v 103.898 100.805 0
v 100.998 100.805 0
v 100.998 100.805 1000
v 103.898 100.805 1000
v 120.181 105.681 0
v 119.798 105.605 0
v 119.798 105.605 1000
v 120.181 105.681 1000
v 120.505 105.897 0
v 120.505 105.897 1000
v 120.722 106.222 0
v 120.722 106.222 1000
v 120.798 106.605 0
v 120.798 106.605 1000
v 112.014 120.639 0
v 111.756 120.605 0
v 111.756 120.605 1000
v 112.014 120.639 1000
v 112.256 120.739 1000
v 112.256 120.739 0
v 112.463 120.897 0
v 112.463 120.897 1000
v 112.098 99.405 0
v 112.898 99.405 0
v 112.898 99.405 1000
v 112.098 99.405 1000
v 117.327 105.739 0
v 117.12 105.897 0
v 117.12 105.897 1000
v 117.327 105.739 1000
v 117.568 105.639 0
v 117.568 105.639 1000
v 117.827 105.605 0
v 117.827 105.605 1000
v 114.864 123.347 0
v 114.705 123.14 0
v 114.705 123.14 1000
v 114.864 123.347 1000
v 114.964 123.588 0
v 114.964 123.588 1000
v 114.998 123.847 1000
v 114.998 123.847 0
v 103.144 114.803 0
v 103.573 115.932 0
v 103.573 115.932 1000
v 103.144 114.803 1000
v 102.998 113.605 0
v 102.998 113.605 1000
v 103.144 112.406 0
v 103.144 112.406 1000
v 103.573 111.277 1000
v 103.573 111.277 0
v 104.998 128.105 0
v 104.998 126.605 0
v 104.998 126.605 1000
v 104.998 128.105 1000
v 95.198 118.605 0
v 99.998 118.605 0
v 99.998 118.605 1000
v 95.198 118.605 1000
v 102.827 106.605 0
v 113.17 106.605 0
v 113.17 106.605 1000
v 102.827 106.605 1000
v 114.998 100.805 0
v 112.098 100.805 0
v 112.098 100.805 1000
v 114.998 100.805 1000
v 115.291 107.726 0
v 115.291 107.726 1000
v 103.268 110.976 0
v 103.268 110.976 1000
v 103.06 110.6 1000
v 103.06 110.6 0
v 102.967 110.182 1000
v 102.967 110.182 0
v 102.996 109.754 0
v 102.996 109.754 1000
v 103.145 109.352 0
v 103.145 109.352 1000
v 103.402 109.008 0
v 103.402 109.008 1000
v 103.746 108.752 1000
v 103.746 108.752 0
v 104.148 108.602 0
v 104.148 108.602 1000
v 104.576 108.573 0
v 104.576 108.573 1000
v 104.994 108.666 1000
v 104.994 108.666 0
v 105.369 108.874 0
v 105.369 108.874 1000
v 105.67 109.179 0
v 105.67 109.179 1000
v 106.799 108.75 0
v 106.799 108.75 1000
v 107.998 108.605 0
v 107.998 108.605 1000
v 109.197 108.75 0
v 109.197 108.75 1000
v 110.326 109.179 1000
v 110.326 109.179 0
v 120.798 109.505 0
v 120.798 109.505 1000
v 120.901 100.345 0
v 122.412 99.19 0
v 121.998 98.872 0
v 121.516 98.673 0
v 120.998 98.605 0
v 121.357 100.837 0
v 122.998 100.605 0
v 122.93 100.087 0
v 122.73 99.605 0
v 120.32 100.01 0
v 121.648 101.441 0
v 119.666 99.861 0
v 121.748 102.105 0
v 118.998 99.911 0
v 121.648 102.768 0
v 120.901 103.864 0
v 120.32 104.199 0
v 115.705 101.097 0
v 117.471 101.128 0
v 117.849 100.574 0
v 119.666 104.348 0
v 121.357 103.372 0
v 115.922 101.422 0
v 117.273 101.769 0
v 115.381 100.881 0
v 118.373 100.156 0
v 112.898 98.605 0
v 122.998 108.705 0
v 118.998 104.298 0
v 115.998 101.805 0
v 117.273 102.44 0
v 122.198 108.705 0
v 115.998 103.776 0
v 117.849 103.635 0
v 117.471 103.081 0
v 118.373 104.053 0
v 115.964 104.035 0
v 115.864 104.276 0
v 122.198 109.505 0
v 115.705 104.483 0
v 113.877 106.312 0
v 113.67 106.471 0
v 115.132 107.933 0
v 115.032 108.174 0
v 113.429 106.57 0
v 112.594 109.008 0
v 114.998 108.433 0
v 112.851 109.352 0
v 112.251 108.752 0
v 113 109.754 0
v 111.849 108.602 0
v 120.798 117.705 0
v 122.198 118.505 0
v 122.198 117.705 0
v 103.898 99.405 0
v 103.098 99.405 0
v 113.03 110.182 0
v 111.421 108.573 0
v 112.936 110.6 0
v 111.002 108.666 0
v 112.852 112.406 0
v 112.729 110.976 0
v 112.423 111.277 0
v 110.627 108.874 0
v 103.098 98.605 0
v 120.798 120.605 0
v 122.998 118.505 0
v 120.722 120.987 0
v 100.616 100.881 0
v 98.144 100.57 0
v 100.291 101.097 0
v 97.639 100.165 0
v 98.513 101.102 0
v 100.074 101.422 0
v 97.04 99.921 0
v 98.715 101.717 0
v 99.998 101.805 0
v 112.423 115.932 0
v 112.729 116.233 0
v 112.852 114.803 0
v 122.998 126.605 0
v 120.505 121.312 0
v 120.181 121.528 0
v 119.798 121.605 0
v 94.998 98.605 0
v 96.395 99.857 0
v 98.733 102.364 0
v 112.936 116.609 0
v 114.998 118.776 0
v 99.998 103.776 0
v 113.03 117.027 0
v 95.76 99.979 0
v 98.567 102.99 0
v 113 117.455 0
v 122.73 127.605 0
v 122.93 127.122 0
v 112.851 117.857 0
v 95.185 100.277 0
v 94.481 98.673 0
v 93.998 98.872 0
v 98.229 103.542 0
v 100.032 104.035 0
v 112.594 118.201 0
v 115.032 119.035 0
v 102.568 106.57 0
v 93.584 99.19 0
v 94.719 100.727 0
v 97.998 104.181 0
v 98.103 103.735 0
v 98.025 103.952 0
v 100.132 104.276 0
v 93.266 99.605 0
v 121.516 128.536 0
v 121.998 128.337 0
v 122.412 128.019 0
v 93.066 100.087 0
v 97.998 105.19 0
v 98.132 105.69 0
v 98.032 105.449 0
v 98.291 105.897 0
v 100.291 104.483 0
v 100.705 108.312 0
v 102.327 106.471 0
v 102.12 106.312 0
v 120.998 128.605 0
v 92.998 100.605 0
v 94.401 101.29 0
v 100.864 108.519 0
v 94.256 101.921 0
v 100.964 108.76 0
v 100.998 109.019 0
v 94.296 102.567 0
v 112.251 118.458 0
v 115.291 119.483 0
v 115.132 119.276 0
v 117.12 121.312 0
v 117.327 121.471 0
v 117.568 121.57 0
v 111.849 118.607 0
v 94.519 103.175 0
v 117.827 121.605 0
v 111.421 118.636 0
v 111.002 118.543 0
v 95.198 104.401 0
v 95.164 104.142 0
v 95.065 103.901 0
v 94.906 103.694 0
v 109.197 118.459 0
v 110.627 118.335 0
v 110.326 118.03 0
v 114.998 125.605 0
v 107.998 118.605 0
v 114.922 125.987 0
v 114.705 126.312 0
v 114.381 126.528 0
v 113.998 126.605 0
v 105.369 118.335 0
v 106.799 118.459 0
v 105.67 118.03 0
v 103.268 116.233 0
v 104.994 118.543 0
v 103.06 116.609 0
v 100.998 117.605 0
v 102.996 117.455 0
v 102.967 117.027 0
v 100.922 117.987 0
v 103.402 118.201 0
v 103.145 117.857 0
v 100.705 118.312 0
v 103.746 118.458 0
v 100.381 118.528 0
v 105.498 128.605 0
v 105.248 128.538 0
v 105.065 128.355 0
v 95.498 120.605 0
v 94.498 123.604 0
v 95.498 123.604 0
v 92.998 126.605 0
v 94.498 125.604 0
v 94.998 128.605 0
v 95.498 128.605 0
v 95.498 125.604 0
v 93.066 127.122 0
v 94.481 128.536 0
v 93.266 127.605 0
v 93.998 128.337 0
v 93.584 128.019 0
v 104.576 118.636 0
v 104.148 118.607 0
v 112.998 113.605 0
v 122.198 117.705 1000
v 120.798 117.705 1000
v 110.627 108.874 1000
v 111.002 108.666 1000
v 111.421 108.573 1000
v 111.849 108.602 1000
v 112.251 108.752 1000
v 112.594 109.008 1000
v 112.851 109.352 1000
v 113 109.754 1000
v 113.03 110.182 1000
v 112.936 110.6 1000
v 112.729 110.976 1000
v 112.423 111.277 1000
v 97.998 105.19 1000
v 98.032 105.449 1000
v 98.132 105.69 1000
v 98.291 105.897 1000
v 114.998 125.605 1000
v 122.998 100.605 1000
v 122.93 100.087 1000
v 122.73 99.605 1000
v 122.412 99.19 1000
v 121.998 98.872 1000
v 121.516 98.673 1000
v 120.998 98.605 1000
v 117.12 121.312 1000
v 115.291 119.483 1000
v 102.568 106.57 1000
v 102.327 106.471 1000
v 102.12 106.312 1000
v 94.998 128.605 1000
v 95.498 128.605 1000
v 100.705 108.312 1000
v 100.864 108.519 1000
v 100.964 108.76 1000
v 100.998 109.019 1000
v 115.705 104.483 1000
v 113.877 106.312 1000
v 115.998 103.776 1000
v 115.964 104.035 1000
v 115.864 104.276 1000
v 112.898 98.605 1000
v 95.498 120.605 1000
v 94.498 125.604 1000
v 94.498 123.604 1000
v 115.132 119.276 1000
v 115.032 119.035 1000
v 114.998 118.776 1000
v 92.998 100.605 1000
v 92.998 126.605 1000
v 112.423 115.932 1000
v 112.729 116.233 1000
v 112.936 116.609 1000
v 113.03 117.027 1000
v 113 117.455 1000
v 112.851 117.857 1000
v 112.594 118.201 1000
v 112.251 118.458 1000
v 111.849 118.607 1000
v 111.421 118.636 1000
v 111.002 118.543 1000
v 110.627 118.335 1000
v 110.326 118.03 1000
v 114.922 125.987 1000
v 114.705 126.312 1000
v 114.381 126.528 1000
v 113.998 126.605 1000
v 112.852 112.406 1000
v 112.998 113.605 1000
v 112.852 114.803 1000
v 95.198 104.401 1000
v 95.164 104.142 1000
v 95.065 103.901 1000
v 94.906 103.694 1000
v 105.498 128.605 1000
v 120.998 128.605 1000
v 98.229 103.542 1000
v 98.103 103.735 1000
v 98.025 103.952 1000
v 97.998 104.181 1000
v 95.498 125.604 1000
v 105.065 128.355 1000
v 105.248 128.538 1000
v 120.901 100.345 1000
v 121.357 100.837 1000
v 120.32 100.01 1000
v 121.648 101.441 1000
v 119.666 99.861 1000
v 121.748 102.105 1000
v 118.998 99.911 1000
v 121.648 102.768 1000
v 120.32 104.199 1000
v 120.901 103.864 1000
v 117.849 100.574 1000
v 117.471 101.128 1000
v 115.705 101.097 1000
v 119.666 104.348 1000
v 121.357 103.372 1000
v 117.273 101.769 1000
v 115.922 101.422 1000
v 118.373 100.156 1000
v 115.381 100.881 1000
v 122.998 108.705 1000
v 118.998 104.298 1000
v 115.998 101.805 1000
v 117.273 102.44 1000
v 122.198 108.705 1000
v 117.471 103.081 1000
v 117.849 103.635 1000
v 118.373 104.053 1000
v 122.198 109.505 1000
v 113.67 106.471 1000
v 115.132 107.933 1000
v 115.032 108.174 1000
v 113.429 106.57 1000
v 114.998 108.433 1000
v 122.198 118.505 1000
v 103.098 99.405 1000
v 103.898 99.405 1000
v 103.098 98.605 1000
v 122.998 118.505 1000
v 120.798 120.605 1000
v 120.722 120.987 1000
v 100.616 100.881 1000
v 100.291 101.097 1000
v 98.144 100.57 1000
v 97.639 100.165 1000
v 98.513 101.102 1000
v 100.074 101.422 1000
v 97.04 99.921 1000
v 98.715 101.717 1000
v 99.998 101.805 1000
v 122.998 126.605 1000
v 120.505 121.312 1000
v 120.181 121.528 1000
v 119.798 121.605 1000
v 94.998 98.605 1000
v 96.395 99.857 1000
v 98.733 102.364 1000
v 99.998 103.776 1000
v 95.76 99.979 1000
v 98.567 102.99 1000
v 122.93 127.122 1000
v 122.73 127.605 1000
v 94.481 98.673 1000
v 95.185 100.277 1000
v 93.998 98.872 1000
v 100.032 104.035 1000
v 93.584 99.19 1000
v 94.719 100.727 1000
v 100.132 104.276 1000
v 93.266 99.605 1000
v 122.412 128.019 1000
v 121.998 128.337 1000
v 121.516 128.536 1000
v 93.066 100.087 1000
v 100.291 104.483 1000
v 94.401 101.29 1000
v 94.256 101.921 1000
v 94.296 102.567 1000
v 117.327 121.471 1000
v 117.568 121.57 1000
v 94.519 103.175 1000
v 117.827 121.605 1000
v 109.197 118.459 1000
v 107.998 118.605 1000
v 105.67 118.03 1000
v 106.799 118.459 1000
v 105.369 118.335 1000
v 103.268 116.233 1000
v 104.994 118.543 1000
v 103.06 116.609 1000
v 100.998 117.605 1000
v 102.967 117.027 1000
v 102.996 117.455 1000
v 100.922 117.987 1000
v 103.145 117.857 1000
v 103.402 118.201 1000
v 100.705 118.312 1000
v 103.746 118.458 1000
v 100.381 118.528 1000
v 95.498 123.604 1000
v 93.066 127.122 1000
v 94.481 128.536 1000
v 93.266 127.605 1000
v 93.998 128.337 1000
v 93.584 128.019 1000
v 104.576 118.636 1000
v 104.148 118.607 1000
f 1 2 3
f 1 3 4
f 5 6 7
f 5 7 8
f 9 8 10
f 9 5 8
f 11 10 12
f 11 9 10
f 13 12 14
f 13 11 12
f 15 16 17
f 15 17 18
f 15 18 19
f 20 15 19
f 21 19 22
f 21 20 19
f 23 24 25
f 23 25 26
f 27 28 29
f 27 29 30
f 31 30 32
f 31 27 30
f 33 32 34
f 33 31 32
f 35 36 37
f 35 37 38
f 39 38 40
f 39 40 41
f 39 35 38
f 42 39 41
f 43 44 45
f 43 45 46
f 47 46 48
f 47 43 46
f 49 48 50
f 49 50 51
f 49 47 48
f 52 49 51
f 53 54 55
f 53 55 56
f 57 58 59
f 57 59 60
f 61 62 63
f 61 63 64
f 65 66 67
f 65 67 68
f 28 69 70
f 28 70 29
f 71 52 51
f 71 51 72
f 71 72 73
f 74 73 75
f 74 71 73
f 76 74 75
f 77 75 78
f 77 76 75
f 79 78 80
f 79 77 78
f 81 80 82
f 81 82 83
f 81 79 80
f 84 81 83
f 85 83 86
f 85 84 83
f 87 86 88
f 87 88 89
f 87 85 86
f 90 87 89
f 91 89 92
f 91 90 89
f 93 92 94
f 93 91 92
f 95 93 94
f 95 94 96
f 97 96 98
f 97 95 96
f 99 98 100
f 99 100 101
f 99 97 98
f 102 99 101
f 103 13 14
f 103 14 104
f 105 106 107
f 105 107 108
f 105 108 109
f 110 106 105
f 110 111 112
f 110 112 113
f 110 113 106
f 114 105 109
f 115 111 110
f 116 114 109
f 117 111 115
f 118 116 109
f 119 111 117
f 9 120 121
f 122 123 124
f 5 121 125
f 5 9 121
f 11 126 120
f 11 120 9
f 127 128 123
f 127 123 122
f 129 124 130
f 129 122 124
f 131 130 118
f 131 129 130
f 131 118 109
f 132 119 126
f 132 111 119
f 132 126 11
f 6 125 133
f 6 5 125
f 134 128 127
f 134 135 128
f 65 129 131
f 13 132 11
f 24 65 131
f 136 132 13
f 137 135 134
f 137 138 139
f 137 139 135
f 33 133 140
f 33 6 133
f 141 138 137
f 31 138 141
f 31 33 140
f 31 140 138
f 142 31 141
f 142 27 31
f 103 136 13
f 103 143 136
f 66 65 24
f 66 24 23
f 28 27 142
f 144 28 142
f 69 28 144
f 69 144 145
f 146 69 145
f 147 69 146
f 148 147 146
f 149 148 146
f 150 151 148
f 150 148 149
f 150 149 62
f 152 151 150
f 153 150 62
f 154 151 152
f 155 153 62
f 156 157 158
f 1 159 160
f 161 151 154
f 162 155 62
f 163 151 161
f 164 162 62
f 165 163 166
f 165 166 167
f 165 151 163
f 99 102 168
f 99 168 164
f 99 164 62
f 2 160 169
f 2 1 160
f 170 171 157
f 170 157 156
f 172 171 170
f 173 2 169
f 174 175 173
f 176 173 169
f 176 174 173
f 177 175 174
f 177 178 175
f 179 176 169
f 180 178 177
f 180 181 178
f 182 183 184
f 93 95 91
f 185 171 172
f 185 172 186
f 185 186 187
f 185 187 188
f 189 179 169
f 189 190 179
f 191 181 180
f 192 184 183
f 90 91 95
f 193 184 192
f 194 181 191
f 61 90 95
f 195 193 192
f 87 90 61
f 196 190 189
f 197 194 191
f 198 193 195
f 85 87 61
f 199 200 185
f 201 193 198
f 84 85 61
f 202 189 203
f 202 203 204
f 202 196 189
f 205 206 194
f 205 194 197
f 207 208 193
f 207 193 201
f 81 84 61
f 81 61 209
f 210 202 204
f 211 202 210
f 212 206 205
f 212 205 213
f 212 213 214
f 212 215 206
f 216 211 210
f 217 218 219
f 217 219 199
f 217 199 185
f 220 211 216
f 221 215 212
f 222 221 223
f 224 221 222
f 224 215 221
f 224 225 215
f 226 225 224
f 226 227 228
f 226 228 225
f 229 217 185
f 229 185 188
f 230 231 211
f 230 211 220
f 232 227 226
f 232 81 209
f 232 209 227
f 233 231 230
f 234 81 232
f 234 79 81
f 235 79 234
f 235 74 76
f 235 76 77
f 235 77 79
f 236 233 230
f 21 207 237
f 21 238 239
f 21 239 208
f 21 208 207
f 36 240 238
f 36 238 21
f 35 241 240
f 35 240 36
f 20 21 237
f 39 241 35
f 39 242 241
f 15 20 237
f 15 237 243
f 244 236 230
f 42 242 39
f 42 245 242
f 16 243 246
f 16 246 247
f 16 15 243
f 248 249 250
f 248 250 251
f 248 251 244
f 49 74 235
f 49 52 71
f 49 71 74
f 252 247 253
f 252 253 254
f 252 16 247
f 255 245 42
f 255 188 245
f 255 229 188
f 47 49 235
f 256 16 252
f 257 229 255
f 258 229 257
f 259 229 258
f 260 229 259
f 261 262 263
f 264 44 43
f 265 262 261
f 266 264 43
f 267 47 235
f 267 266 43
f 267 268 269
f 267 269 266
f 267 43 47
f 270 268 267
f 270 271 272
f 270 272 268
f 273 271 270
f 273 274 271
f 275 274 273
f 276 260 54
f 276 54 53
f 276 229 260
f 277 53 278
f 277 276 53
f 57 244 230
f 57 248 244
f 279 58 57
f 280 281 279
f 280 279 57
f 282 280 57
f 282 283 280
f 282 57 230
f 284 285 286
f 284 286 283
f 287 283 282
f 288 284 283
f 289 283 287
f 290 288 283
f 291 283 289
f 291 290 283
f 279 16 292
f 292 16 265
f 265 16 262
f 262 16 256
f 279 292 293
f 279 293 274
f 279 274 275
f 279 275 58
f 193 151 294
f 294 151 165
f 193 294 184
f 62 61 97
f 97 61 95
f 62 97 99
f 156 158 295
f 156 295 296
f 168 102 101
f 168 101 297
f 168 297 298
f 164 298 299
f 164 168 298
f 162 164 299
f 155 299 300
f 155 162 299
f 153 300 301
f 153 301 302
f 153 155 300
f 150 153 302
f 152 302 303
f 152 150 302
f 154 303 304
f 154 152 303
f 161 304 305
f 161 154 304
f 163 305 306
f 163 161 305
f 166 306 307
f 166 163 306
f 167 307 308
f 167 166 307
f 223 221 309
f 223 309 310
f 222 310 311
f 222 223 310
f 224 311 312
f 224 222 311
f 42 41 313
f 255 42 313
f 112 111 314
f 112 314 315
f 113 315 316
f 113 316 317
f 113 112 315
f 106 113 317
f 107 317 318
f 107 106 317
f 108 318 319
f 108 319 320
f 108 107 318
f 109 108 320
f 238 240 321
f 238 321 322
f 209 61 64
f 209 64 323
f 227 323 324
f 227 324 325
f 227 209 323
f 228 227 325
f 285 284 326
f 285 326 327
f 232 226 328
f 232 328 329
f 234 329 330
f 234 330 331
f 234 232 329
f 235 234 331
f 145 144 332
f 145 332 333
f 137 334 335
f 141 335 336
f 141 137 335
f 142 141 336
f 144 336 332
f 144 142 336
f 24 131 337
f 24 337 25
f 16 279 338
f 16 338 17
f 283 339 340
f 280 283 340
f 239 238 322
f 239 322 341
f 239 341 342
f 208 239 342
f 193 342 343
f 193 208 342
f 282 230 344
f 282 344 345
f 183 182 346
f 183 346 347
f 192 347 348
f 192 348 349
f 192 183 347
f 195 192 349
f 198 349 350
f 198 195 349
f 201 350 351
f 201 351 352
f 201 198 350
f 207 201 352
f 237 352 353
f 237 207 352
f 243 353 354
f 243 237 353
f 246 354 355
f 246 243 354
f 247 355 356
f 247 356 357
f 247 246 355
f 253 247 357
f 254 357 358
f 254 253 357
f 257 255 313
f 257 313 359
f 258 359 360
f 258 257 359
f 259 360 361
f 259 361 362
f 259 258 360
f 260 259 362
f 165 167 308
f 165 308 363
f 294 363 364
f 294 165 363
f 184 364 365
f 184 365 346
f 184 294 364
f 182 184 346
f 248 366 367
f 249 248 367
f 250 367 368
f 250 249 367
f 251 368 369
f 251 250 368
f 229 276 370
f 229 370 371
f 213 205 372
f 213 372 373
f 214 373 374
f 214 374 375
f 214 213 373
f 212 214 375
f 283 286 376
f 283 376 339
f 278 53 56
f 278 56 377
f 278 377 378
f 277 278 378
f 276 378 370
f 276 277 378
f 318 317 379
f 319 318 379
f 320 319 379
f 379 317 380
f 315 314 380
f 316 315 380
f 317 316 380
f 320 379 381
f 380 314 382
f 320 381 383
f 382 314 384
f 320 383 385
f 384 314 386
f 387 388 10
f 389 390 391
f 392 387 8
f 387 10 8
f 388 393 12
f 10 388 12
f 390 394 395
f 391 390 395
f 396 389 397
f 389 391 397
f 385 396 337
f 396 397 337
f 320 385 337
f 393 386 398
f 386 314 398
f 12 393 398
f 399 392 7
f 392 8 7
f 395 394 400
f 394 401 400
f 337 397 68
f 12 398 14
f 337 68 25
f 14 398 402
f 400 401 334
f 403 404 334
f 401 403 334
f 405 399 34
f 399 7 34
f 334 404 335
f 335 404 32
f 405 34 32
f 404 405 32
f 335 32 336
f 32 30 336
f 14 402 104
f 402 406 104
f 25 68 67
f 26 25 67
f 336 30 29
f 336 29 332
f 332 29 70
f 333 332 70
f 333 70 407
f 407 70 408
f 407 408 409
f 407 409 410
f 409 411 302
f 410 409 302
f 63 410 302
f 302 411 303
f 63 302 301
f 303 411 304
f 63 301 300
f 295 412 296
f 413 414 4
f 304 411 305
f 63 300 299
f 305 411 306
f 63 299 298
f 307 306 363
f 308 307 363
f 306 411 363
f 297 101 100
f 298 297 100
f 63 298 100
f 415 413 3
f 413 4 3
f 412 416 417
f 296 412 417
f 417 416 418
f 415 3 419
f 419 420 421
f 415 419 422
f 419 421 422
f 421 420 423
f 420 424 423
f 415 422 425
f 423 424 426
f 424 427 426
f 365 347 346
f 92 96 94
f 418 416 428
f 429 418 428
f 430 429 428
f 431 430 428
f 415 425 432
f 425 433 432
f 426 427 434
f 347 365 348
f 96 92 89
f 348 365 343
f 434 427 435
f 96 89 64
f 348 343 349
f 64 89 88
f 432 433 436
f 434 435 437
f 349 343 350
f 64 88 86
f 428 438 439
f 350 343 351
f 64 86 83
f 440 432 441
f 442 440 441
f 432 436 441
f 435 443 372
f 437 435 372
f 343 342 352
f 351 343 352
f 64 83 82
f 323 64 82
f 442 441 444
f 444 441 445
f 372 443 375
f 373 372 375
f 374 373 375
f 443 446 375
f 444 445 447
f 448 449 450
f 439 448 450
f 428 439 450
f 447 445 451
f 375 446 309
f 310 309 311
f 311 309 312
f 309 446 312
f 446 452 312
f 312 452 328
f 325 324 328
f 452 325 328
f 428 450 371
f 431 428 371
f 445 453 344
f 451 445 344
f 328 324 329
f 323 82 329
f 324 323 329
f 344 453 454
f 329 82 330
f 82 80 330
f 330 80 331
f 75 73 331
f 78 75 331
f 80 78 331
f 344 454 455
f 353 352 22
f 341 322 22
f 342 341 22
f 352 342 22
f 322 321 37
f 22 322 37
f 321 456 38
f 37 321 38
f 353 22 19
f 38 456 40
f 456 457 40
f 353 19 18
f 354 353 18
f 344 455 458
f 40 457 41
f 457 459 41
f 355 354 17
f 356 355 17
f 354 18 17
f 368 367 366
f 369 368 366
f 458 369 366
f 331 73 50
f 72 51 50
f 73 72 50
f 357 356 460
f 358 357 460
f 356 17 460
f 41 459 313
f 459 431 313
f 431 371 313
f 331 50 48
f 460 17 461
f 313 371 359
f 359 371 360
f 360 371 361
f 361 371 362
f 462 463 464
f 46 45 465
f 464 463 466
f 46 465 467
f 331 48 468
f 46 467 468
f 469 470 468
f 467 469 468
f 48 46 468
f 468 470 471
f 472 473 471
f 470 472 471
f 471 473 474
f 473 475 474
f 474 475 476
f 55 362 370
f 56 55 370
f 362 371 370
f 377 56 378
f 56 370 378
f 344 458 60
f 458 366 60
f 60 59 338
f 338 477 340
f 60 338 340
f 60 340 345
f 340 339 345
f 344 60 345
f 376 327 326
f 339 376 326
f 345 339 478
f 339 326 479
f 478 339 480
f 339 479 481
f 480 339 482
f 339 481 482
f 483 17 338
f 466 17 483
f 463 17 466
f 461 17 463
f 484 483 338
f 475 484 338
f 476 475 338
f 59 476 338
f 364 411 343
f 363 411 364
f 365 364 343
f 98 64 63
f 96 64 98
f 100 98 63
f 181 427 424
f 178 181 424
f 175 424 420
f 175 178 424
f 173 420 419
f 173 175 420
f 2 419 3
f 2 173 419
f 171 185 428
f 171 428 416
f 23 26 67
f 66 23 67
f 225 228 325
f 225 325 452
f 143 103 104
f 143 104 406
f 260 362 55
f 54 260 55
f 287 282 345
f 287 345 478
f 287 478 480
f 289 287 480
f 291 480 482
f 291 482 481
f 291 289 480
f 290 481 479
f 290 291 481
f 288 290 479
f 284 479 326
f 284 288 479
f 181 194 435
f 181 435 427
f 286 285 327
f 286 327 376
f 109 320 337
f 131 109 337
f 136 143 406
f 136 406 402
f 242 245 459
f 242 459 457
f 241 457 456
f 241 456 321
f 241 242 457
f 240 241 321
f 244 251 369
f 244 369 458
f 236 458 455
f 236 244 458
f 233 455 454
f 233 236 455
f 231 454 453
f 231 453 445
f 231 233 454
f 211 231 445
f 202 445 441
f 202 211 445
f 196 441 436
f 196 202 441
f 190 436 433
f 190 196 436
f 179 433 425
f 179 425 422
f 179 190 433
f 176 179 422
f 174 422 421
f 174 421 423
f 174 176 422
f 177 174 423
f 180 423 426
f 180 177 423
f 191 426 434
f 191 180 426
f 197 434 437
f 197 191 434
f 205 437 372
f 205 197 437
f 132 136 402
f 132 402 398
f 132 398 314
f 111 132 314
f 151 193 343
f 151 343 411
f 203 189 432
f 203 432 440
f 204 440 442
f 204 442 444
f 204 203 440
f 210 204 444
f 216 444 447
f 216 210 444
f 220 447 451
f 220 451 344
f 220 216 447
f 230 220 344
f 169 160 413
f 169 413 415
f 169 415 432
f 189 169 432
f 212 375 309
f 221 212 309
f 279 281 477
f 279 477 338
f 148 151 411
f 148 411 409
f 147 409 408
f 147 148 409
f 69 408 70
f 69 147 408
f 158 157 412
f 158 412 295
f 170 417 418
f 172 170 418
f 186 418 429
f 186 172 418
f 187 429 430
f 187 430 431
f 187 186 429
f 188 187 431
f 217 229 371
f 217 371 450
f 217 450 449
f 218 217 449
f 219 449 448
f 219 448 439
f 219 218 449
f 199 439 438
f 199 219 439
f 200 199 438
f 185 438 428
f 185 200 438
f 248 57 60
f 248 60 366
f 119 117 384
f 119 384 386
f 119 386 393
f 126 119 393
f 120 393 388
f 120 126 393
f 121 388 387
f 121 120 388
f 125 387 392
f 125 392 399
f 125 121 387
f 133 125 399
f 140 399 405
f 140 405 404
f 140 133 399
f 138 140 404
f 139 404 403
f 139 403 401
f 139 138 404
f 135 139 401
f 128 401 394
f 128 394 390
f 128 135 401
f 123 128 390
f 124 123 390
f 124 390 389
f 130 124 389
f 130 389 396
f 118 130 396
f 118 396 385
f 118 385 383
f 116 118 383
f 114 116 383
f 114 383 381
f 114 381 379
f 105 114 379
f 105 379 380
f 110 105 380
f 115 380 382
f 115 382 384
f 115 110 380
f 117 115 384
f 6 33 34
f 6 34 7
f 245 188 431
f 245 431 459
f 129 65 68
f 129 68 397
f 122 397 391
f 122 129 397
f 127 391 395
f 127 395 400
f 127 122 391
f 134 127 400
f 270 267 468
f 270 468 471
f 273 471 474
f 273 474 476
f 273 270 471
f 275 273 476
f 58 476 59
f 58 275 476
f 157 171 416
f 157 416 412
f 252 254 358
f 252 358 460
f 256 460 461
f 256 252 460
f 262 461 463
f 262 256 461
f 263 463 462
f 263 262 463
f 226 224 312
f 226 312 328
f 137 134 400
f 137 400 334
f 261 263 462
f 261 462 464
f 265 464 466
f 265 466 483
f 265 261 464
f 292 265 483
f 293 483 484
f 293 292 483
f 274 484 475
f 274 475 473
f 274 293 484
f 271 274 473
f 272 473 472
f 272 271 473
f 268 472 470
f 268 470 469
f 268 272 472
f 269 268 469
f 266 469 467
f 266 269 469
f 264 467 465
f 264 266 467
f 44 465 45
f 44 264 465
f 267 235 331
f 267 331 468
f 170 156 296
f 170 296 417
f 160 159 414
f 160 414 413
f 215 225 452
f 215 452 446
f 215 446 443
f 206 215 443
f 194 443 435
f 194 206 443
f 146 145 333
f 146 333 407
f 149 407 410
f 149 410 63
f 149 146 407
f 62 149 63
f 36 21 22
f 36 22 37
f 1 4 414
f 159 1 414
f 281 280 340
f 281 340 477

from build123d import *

# Parameters (mm, degrees)
SKETCH_1_R      = 2.25
EXTRUDE_1_DEPTH = 1000


with BuildPart() as part:
    # 草图1 → 拉伸1 (new body)
    with BuildSketch(Plane.XY):
        with BuildLine():
            Line((94.498219996, 123.603787887), (95.498219996, 123.603787887))
            Line((95.498219996, 123.603787887), (95.498219996, 120.604545229))
            Line((95.498219996, 120.604545229), (111.7555793, 120.604545229))
            ThreePointArc((111.7555793, 120.604545229), (112.138262733, 120.680665697), (112.462686082, 120.897438448))
            Line((112.462686082, 120.897438448), (114.705326774, 123.140079141))
            ThreePointArc((114.705326774, 123.140079141), (114.922099526, 123.46450249), (114.998219993, 123.847185922))
            Line((114.998219993, 123.847185922), (114.998219993, 125.604545228))
            ThreePointArc((114.998219993, 125.604545228), (114.705326774, 126.311652009), (113.998219993, 126.604545228))
            Line((113.998219993, 126.604545228), (104.998159012, 126.604545228))
            Line((104.998159012, 126.604545228), (104.998159012, 128.104545228))
            ThreePointArc((104.998159012, 128.104545228), (105.144605621, 128.458098618), (105.498159012, 128.604545228))
            Line((105.498159012, 128.604545228), (120.998159011, 128.604545228))
            ThreePointArc((120.998159011, 128.604545228), (122.412372573, 128.01875879), (122.998159011, 126.604545228))
            Line((122.998159011, 126.604545228), (122.998159011, 118.504545232))
            Line((122.998159011, 118.504545232), (122.198159011, 118.504545232))
            Line((122.198159011, 118.504545232), (122.198159011, 117.704545232))
            Line((122.198159011, 117.704545232), (120.798219991, 117.704545232))
            Line((120.798219991, 117.704545232), (120.798219991, 120.604545232))
            ThreePointArc((120.798219991, 120.604545232), (120.505326773, 121.311652013), (119.798219991, 121.604545232))
            Line((119.798219991, 121.604545232), (117.826647118, 121.604545232))
            ThreePointArc((117.826647118, 121.604545232), (117.443963686, 121.528424765), (117.119540337, 121.311652013))
            Line((117.119540337, 121.311652013), (115.291113212, 119.483224889))
            ThreePointArc((115.291113212, 119.483224889), (115.074340461, 119.15880154), (114.998219993, 118.776118107))
            Line((114.998219993, 118.776118107), (114.998219993, 108.432972357))
            ThreePointArc((114.998219993, 108.432972357), (115.074340461, 108.050288925), (115.291113212, 107.725865576))
            Line((115.291113212, 107.725865576), (117.119540337, 105.897438451))
            ThreePointArc((117.119540337, 105.897438451), (117.443963686, 105.6806657), (117.826647118, 105.604545232))
            Line((117.826647118, 105.604545232), (119.798219991, 105.604545232))
            ThreePointArc((119.798219991, 105.604545232), (120.505326773, 105.897438451), (120.798219991, 106.604545232))
            Line((120.798219991, 106.604545232), (120.798219991, 109.504545225))
            Line((120.798219991, 109.504545225), (122.198159011, 109.504545225))
            Line((122.198159011, 109.504545225), (122.198159011, 108.704545225))
            Line((122.198159011, 108.704545225), (122.998159011, 108.704545225))
            Line((122.998159011, 108.704545225), (122.998159011, 100.60454523))
            ThreePointArc((122.998159011, 100.60454523), (122.412372573, 99.190331667), (120.998159011, 98.60454523))
            Line((120.998159011, 98.60454523), (112.898159016, 98.60454523))
            Line((112.898159016, 98.60454523), (112.898159016, 99.40454523))
            Line((112.898159016, 99.40454523), (112.098159016, 99.40454523))
            Line((112.098159016, 99.40454523), (112.098159016, 100.804545237))
            Line((112.098159016, 100.804545237), (114.998219996, 100.804545237))
            ThreePointArc((114.998219996, 100.804545237), (115.705326777, 101.097438456), (115.998219996, 101.804545237))
            Line((115.998219996, 101.804545237), (115.998219996, 103.77611811))
            ThreePointArc((115.998219996, 103.77611811), (115.922099529, 104.158801543), (115.705326777, 104.483224892))
            Line((115.705326777, 104.483224892), (113.876899653, 106.311652016))
            ThreePointArc((113.876899653, 106.311652016), (113.552476304, 106.528424768), (113.169792871, 106.604545235))
            Line((113.169792871, 106.604545235), (102.826647121, 106.604545235))
            ThreePointArc((102.826647121, 106.604545235), (102.443963688, 106.528424768), (102.11954034, 106.311652016))
            Line((102.11954034, 106.311652016), (100.291113215, 104.483224892))
            ThreePointArc((100.291113215, 104.483224892), (100.074340464, 104.158801543), (99.998219996, 103.77611811))
            Line((99.998219996, 103.77611811), (99.998219996, 101.804545237))
            ThreePointArc((99.998219996, 101.804545237), (100.291113215, 101.097438456), (100.998219996, 100.804545237))
            Line((100.998219996, 100.804545237), (103.898159009, 100.804545237))
            Line((103.898159009, 100.804545237), (103.898159009, 99.40454523))
            Line((103.898159009, 99.40454523), (103.098159009, 99.40454523))
            Line((103.098159009, 99.40454523), (103.098159009, 98.60454523))
            Line((103.098159009, 98.60454523), (94.998159011, 98.60454523))
            ThreePointArc((94.998159011, 98.60454523), (93.583945449, 99.190331667), (92.998159011, 100.60454523))
            Line((92.998159011, 100.60454523), (92.998159011, 126.604545228))
            ThreePointArc((92.998159011, 126.604545228), (93.583945449, 128.01875879), (94.998159011, 128.604545228))
            Line((94.998159011, 128.604545228), (95.498219996, 128.604545228))
            Line((95.498219996, 128.604545228), (95.498219996, 125.603787887))
            Line((95.498219996, 125.603787887), (94.498219996, 125.603787887))
            Line((94.498219996, 125.603787887), (94.498219996, 123.603787887))
        make_face()
        with Locations((119.498219995, 102.104545233)):
            Circle(SKETCH_1_R, mode=Mode.SUBTRACT)
        with BuildLine():
            Line((97.998219996, 104.1812012), (97.998219996, 105.19033167))
            ThreePointArc((97.998219996, 105.19033167), (98.074340464, 105.573015102), (98.291113215, 105.897438451))
            Line((98.291113215, 105.897438451), (100.70532678, 108.311652016))
            ThreePointArc((100.70532678, 108.311652016), (100.922099531, 108.636075365), (100.998219999, 109.018758797))
            Line((100.998219999, 109.018758797), (100.998219999, 117.604545229))
            ThreePointArc((100.998219999, 117.604545229), (100.70532678, 118.311652011), (99.998219999, 118.604545229))
            Line((99.998219999, 118.604545229), (95.198219996, 118.604545229))
            Line((95.198219996, 118.604545229), (95.198219996, 104.400737733))
            ThreePointArc((95.198219996, 104.400737733), (95.122257957, 104.018437006), (94.905912304, 103.694216964))
            ThreePointArc((94.905912304, 103.694216964), (96.395419712, 99.856894882), (98.228989227, 103.542230133))
            ThreePointArc((98.228989227, 103.542230133), (98.057680053, 103.841518089), (97.998219996, 104.1812012))
        make_face(mode=Mode.SUBTRACT)
        with BuildLine():
            ThreePointArc((103.573125257, 115.932320253), (102.998219996, 113.604545232), (103.573125257, 111.276770211))
            ThreePointArc((103.573125257, 111.276770211), (103.402025918, 109.008351155), (105.670444975, 109.179450493))
            ThreePointArc((105.670444975, 109.179450493), (107.998219996, 108.604545232), (110.325995017, 109.179450493))
            ThreePointArc((110.325995017, 109.179450493), (112.594414074, 109.008351155), (112.423314735, 111.276770211))
            ThreePointArc((112.423314735, 111.276770211), (112.998219996, 113.604545232), (112.423314735, 115.932320253))
            ThreePointArc((112.423314735, 115.932320253), (112.594414074, 118.20073931), (110.325995017, 118.029639971))
            ThreePointArc((110.325995017, 118.029639971), (107.998219996, 118.604545232), (105.670444975, 118.029639971))
            ThreePointArc((105.670444975, 118.029639971), (103.402025918, 118.20073931), (103.573125257, 115.932320253))
        make_face(mode=Mode.SUBTRACT)
    extrude(amount=EXTRUDE_1_DEPTH)


solid = part.part
